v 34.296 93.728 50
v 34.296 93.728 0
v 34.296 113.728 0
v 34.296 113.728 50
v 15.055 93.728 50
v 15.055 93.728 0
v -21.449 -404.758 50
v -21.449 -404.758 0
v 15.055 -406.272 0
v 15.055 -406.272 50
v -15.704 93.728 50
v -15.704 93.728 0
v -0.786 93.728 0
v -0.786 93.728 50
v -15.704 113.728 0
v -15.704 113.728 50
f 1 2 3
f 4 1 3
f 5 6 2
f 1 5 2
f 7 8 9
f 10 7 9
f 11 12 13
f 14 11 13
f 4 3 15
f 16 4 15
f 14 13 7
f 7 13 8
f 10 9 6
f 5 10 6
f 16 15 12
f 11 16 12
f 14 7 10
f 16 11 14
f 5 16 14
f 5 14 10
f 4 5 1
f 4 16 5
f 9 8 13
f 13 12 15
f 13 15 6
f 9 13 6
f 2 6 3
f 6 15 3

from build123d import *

# Parameters (mm, degrees)
BOSS_EXTRUDE1_DEPTH = 50


with BuildPart() as part:
    # Sketch1 → Boss-Extrude1 (new body)
    with BuildSketch(Plane.XY):
        Polygon((15.05518629, 93.72842378), (9.296047762, 93.72842378), (-0.786164341, 93.72842378), (-21.44867742, -404.758474142), (15.05518629, -406.27157622), align=None)
        Polygon((-0.786164341, 93.72842378), (9.296047762, 93.72842378), (15.05518629, 93.72842378), (34.296047762, 93.72842378), (34.296047762, 113.72842378), (-15.703952238, 113.72842378), (-15.703952238, 93.72842378), align=None)
    extrude(amount=BOSS_EXTRUDE1_DEPTH)


solid = part.part
